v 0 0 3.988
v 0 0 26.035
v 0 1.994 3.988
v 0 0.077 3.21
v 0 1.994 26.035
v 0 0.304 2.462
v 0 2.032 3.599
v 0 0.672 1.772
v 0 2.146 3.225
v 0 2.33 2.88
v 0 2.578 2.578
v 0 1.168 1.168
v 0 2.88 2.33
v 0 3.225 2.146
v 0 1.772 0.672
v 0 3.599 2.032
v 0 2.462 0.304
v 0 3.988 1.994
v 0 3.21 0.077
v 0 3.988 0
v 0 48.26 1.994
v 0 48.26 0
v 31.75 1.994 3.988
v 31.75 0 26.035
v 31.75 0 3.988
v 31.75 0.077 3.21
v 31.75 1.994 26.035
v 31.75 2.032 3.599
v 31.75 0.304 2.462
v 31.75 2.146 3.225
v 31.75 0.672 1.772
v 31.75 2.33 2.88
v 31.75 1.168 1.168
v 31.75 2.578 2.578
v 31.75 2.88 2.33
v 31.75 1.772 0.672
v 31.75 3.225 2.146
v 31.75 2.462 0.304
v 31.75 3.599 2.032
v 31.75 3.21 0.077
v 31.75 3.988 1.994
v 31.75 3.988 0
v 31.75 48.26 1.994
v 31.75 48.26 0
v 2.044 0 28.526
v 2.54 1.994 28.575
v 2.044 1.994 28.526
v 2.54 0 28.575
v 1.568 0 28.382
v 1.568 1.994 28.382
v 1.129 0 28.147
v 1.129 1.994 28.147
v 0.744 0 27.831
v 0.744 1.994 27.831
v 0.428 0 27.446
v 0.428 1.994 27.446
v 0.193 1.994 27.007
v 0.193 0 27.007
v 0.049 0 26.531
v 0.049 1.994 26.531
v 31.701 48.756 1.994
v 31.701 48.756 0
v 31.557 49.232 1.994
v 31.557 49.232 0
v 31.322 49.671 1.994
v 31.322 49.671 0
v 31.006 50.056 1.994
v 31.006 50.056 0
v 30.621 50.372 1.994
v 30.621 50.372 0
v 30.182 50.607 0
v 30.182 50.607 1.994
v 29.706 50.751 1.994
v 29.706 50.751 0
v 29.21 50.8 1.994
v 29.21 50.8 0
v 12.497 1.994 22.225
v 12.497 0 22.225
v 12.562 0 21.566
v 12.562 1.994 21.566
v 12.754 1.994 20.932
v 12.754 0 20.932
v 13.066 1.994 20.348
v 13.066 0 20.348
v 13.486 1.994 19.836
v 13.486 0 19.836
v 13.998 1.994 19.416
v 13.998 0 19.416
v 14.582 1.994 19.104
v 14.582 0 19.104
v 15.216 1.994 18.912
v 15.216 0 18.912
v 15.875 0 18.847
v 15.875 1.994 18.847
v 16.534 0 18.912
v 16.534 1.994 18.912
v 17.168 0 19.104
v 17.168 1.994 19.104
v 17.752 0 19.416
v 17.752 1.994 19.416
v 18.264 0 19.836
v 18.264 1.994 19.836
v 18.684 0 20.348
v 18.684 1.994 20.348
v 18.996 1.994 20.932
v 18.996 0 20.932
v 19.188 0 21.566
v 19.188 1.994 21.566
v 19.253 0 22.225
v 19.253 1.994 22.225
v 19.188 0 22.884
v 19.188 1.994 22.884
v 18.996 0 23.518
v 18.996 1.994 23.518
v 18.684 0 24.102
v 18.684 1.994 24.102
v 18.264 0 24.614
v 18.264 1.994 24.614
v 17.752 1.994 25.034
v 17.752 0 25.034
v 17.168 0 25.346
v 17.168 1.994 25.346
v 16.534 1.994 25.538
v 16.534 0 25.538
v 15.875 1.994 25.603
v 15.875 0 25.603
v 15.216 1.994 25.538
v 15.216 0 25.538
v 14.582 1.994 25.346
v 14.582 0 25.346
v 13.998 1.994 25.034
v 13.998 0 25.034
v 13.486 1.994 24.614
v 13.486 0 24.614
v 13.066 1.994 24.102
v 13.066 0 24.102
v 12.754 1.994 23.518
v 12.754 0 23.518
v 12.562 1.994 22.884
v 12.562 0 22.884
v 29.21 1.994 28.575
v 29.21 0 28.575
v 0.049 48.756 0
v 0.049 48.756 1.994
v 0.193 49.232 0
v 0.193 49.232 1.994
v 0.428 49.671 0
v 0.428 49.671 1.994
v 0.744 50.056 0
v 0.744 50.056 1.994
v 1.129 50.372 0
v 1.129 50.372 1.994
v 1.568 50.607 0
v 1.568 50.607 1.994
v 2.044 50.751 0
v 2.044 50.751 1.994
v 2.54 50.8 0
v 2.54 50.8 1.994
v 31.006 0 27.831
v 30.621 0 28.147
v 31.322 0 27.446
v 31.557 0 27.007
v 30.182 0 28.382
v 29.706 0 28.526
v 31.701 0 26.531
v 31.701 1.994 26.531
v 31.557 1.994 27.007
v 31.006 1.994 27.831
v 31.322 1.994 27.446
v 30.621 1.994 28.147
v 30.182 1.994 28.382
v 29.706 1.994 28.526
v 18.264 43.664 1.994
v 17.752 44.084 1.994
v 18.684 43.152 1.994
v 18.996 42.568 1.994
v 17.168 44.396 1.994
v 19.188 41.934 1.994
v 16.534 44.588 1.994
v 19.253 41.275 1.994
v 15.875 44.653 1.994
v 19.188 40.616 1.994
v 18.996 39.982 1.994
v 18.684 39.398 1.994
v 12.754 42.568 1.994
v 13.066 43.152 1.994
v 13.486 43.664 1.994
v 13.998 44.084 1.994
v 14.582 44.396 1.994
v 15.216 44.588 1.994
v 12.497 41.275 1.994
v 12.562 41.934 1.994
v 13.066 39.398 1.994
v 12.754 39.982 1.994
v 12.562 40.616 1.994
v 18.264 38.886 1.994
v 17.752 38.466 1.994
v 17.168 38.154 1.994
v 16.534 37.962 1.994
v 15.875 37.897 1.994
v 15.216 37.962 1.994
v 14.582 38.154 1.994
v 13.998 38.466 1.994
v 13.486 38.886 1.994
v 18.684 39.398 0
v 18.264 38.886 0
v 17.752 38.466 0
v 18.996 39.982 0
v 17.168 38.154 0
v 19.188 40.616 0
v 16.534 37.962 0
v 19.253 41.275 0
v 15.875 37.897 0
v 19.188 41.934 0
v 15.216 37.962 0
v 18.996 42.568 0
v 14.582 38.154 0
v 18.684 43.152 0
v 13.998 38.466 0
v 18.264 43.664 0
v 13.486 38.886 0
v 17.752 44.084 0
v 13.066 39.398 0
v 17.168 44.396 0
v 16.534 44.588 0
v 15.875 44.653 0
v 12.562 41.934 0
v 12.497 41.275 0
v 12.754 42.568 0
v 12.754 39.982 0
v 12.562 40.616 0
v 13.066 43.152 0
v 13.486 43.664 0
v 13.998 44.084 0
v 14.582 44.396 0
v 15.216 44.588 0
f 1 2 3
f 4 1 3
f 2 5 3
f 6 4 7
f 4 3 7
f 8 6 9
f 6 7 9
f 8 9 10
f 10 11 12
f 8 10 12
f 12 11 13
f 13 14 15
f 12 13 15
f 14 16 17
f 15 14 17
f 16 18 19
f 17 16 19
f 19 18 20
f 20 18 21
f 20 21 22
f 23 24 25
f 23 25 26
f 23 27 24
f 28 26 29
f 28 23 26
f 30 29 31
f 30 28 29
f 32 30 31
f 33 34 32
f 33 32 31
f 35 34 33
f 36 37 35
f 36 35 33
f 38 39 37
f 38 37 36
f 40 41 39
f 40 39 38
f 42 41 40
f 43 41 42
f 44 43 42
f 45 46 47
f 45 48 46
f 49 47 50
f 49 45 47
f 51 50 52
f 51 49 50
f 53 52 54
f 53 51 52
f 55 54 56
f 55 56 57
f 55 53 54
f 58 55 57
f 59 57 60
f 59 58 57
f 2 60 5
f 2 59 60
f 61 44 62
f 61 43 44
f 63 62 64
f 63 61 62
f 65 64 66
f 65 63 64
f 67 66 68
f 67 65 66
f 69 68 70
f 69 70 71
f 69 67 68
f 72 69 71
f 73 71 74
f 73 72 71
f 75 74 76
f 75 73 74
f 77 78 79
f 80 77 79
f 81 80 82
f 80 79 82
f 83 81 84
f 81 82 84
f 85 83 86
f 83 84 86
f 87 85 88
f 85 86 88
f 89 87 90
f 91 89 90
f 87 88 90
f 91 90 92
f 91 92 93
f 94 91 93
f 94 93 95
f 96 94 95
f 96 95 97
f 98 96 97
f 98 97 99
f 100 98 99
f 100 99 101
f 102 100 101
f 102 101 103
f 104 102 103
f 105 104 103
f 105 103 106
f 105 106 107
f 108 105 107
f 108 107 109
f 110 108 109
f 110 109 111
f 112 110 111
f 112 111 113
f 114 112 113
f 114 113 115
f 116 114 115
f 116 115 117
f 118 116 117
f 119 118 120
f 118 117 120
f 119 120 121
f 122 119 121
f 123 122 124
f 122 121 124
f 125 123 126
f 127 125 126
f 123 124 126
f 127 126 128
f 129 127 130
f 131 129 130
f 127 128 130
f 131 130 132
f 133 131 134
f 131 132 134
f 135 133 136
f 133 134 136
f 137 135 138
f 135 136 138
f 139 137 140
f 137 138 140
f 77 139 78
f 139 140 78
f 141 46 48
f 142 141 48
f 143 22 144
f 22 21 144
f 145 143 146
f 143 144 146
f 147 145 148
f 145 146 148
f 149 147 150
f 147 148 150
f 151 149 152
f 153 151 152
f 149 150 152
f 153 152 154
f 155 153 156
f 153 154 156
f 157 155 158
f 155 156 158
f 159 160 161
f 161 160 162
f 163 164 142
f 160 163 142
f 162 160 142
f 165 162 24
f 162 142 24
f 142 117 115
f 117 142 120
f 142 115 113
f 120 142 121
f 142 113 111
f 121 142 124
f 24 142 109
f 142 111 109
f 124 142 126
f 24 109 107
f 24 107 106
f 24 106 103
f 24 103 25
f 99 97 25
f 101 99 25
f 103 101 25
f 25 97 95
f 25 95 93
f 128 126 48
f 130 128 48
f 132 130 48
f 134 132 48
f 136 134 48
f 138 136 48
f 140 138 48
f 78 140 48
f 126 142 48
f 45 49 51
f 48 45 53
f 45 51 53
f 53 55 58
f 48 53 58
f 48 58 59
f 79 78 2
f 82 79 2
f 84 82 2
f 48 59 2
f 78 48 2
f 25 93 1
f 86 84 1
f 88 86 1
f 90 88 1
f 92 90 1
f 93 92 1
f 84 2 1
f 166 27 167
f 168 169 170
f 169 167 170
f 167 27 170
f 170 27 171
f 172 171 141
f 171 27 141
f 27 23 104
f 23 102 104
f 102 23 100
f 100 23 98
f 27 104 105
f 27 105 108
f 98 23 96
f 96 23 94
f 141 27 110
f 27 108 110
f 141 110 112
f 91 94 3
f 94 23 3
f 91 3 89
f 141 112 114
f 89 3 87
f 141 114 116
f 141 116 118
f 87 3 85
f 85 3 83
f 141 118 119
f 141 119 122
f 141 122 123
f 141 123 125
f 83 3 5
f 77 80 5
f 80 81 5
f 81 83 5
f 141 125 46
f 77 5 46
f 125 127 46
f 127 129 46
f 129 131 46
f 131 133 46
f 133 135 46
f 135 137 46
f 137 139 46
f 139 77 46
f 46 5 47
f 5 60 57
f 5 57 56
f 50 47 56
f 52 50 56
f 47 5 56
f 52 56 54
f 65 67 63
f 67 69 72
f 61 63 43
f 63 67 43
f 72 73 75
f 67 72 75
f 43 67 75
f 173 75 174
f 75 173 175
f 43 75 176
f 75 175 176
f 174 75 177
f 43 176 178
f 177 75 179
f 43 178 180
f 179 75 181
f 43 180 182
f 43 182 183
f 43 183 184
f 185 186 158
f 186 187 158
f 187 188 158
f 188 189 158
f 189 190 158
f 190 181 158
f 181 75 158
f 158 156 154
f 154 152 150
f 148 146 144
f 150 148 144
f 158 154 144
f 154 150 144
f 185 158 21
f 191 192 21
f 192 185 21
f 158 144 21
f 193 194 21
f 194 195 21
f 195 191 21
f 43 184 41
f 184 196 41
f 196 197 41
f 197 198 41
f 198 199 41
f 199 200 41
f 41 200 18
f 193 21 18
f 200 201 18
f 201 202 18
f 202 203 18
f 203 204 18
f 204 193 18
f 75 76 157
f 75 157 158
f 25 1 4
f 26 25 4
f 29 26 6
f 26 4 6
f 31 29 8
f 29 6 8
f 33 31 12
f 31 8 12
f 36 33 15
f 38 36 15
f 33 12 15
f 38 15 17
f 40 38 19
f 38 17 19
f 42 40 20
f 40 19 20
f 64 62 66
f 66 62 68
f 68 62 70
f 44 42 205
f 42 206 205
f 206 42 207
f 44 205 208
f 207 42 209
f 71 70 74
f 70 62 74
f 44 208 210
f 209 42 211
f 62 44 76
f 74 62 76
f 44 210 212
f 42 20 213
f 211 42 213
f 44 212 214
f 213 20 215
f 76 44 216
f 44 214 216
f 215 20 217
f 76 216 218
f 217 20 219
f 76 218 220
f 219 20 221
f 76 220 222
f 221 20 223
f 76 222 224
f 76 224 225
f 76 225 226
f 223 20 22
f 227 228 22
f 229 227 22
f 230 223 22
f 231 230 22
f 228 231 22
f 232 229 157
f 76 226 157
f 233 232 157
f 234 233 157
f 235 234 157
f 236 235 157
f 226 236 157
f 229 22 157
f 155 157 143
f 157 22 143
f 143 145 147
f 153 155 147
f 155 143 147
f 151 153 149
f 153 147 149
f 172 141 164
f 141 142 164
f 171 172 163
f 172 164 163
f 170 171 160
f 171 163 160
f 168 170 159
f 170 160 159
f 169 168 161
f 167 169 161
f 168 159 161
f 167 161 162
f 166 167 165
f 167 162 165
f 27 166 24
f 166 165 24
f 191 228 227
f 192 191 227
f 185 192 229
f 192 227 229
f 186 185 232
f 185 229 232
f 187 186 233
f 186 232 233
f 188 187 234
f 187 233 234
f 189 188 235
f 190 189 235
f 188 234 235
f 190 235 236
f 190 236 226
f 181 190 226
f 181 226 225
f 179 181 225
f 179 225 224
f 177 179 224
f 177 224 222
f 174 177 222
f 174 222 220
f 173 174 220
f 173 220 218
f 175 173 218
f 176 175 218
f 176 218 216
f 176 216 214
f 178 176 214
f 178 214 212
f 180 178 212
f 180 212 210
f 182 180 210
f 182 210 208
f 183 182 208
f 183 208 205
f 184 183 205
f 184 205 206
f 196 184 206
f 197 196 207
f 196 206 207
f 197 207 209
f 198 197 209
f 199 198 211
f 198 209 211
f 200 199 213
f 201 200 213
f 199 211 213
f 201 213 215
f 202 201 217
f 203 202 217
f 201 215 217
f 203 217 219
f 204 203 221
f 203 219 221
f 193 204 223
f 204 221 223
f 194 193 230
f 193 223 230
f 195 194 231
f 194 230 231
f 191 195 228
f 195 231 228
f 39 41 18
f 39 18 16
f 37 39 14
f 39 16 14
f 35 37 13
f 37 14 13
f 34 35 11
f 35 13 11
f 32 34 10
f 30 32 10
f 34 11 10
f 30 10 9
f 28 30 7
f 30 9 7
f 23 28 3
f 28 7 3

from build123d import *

# Parameters (mm, degrees)
BASE_FLANGE1_DEPTH      = 31.75
F_1_4_CLEARANCE_HOLE1_D = 6.7564
F_1_4_CLEARANCE_HOLE2_D = 6.7564
FILLET1_R               = 2.54


# Sheet-metal steps are written as plain solids
with BuildPart() as part:
    # Sketch1 → Base-Flange1 (new body)
    with BuildSketch(Plane(origin=(0, 0, 0), x_dir=(0, 0, -1), z_dir=(1, 0, 0))):
        with BuildLine():
            Line((-28.575, 0), (-3.9878, 0))
            ThreePointArc((-3.9878, 0), (-1.167999578, 1.167999578), (0, 3.9878))
            Line((0, 3.9878), (0, 50.8))
            Line((0, 50.8), (-1.9939, 50.8))
            Line((-1.9939, 50.8), (-1.9939, 3.9878))
            ThreePointArc((-1.9939, 3.9878), (-2.577899789, 2.577899789), (-3.9878, 1.9939))
            Line((-3.9878, 1.9939), (-28.575, 1.9939))
            Line((-28.575, 1.9939), (-28.575, 0))
        make_face()
    extrude(amount=BASE_FLANGE1_DEPTH)

    # 1/4 Clearance Hole1 (through all)
    with Locations(Plane.XY.offset(1.9939)):
        with Locations((15.875, 41.275)):
            Hole(F_1_4_CLEARANCE_HOLE1_D / 2)

    # 1/4 Clearance Hole2 (through all)
    with Locations(Plane(origin=(0, 1.9939, 0), x_dir=(1, 0, 0), z_dir=(0, 1, 0))):
        with Locations((15.875, -22.225)):
            Hole(F_1_4_CLEARANCE_HOLE2_D / 2)

    # Fillet1
    fillet1_edges = [part.edges().sort_by_distance(p)[0] for p in [
        (31.75, 0.99695, 28.575),
        (0, 0.99695, 28.575),
        (31.75, 50.8, 0.99695),
        (0, 50.8, 0.99695),
    ]]
    fillet(fillet1_edges, radius=FILLET1_R)


solid = part.part
